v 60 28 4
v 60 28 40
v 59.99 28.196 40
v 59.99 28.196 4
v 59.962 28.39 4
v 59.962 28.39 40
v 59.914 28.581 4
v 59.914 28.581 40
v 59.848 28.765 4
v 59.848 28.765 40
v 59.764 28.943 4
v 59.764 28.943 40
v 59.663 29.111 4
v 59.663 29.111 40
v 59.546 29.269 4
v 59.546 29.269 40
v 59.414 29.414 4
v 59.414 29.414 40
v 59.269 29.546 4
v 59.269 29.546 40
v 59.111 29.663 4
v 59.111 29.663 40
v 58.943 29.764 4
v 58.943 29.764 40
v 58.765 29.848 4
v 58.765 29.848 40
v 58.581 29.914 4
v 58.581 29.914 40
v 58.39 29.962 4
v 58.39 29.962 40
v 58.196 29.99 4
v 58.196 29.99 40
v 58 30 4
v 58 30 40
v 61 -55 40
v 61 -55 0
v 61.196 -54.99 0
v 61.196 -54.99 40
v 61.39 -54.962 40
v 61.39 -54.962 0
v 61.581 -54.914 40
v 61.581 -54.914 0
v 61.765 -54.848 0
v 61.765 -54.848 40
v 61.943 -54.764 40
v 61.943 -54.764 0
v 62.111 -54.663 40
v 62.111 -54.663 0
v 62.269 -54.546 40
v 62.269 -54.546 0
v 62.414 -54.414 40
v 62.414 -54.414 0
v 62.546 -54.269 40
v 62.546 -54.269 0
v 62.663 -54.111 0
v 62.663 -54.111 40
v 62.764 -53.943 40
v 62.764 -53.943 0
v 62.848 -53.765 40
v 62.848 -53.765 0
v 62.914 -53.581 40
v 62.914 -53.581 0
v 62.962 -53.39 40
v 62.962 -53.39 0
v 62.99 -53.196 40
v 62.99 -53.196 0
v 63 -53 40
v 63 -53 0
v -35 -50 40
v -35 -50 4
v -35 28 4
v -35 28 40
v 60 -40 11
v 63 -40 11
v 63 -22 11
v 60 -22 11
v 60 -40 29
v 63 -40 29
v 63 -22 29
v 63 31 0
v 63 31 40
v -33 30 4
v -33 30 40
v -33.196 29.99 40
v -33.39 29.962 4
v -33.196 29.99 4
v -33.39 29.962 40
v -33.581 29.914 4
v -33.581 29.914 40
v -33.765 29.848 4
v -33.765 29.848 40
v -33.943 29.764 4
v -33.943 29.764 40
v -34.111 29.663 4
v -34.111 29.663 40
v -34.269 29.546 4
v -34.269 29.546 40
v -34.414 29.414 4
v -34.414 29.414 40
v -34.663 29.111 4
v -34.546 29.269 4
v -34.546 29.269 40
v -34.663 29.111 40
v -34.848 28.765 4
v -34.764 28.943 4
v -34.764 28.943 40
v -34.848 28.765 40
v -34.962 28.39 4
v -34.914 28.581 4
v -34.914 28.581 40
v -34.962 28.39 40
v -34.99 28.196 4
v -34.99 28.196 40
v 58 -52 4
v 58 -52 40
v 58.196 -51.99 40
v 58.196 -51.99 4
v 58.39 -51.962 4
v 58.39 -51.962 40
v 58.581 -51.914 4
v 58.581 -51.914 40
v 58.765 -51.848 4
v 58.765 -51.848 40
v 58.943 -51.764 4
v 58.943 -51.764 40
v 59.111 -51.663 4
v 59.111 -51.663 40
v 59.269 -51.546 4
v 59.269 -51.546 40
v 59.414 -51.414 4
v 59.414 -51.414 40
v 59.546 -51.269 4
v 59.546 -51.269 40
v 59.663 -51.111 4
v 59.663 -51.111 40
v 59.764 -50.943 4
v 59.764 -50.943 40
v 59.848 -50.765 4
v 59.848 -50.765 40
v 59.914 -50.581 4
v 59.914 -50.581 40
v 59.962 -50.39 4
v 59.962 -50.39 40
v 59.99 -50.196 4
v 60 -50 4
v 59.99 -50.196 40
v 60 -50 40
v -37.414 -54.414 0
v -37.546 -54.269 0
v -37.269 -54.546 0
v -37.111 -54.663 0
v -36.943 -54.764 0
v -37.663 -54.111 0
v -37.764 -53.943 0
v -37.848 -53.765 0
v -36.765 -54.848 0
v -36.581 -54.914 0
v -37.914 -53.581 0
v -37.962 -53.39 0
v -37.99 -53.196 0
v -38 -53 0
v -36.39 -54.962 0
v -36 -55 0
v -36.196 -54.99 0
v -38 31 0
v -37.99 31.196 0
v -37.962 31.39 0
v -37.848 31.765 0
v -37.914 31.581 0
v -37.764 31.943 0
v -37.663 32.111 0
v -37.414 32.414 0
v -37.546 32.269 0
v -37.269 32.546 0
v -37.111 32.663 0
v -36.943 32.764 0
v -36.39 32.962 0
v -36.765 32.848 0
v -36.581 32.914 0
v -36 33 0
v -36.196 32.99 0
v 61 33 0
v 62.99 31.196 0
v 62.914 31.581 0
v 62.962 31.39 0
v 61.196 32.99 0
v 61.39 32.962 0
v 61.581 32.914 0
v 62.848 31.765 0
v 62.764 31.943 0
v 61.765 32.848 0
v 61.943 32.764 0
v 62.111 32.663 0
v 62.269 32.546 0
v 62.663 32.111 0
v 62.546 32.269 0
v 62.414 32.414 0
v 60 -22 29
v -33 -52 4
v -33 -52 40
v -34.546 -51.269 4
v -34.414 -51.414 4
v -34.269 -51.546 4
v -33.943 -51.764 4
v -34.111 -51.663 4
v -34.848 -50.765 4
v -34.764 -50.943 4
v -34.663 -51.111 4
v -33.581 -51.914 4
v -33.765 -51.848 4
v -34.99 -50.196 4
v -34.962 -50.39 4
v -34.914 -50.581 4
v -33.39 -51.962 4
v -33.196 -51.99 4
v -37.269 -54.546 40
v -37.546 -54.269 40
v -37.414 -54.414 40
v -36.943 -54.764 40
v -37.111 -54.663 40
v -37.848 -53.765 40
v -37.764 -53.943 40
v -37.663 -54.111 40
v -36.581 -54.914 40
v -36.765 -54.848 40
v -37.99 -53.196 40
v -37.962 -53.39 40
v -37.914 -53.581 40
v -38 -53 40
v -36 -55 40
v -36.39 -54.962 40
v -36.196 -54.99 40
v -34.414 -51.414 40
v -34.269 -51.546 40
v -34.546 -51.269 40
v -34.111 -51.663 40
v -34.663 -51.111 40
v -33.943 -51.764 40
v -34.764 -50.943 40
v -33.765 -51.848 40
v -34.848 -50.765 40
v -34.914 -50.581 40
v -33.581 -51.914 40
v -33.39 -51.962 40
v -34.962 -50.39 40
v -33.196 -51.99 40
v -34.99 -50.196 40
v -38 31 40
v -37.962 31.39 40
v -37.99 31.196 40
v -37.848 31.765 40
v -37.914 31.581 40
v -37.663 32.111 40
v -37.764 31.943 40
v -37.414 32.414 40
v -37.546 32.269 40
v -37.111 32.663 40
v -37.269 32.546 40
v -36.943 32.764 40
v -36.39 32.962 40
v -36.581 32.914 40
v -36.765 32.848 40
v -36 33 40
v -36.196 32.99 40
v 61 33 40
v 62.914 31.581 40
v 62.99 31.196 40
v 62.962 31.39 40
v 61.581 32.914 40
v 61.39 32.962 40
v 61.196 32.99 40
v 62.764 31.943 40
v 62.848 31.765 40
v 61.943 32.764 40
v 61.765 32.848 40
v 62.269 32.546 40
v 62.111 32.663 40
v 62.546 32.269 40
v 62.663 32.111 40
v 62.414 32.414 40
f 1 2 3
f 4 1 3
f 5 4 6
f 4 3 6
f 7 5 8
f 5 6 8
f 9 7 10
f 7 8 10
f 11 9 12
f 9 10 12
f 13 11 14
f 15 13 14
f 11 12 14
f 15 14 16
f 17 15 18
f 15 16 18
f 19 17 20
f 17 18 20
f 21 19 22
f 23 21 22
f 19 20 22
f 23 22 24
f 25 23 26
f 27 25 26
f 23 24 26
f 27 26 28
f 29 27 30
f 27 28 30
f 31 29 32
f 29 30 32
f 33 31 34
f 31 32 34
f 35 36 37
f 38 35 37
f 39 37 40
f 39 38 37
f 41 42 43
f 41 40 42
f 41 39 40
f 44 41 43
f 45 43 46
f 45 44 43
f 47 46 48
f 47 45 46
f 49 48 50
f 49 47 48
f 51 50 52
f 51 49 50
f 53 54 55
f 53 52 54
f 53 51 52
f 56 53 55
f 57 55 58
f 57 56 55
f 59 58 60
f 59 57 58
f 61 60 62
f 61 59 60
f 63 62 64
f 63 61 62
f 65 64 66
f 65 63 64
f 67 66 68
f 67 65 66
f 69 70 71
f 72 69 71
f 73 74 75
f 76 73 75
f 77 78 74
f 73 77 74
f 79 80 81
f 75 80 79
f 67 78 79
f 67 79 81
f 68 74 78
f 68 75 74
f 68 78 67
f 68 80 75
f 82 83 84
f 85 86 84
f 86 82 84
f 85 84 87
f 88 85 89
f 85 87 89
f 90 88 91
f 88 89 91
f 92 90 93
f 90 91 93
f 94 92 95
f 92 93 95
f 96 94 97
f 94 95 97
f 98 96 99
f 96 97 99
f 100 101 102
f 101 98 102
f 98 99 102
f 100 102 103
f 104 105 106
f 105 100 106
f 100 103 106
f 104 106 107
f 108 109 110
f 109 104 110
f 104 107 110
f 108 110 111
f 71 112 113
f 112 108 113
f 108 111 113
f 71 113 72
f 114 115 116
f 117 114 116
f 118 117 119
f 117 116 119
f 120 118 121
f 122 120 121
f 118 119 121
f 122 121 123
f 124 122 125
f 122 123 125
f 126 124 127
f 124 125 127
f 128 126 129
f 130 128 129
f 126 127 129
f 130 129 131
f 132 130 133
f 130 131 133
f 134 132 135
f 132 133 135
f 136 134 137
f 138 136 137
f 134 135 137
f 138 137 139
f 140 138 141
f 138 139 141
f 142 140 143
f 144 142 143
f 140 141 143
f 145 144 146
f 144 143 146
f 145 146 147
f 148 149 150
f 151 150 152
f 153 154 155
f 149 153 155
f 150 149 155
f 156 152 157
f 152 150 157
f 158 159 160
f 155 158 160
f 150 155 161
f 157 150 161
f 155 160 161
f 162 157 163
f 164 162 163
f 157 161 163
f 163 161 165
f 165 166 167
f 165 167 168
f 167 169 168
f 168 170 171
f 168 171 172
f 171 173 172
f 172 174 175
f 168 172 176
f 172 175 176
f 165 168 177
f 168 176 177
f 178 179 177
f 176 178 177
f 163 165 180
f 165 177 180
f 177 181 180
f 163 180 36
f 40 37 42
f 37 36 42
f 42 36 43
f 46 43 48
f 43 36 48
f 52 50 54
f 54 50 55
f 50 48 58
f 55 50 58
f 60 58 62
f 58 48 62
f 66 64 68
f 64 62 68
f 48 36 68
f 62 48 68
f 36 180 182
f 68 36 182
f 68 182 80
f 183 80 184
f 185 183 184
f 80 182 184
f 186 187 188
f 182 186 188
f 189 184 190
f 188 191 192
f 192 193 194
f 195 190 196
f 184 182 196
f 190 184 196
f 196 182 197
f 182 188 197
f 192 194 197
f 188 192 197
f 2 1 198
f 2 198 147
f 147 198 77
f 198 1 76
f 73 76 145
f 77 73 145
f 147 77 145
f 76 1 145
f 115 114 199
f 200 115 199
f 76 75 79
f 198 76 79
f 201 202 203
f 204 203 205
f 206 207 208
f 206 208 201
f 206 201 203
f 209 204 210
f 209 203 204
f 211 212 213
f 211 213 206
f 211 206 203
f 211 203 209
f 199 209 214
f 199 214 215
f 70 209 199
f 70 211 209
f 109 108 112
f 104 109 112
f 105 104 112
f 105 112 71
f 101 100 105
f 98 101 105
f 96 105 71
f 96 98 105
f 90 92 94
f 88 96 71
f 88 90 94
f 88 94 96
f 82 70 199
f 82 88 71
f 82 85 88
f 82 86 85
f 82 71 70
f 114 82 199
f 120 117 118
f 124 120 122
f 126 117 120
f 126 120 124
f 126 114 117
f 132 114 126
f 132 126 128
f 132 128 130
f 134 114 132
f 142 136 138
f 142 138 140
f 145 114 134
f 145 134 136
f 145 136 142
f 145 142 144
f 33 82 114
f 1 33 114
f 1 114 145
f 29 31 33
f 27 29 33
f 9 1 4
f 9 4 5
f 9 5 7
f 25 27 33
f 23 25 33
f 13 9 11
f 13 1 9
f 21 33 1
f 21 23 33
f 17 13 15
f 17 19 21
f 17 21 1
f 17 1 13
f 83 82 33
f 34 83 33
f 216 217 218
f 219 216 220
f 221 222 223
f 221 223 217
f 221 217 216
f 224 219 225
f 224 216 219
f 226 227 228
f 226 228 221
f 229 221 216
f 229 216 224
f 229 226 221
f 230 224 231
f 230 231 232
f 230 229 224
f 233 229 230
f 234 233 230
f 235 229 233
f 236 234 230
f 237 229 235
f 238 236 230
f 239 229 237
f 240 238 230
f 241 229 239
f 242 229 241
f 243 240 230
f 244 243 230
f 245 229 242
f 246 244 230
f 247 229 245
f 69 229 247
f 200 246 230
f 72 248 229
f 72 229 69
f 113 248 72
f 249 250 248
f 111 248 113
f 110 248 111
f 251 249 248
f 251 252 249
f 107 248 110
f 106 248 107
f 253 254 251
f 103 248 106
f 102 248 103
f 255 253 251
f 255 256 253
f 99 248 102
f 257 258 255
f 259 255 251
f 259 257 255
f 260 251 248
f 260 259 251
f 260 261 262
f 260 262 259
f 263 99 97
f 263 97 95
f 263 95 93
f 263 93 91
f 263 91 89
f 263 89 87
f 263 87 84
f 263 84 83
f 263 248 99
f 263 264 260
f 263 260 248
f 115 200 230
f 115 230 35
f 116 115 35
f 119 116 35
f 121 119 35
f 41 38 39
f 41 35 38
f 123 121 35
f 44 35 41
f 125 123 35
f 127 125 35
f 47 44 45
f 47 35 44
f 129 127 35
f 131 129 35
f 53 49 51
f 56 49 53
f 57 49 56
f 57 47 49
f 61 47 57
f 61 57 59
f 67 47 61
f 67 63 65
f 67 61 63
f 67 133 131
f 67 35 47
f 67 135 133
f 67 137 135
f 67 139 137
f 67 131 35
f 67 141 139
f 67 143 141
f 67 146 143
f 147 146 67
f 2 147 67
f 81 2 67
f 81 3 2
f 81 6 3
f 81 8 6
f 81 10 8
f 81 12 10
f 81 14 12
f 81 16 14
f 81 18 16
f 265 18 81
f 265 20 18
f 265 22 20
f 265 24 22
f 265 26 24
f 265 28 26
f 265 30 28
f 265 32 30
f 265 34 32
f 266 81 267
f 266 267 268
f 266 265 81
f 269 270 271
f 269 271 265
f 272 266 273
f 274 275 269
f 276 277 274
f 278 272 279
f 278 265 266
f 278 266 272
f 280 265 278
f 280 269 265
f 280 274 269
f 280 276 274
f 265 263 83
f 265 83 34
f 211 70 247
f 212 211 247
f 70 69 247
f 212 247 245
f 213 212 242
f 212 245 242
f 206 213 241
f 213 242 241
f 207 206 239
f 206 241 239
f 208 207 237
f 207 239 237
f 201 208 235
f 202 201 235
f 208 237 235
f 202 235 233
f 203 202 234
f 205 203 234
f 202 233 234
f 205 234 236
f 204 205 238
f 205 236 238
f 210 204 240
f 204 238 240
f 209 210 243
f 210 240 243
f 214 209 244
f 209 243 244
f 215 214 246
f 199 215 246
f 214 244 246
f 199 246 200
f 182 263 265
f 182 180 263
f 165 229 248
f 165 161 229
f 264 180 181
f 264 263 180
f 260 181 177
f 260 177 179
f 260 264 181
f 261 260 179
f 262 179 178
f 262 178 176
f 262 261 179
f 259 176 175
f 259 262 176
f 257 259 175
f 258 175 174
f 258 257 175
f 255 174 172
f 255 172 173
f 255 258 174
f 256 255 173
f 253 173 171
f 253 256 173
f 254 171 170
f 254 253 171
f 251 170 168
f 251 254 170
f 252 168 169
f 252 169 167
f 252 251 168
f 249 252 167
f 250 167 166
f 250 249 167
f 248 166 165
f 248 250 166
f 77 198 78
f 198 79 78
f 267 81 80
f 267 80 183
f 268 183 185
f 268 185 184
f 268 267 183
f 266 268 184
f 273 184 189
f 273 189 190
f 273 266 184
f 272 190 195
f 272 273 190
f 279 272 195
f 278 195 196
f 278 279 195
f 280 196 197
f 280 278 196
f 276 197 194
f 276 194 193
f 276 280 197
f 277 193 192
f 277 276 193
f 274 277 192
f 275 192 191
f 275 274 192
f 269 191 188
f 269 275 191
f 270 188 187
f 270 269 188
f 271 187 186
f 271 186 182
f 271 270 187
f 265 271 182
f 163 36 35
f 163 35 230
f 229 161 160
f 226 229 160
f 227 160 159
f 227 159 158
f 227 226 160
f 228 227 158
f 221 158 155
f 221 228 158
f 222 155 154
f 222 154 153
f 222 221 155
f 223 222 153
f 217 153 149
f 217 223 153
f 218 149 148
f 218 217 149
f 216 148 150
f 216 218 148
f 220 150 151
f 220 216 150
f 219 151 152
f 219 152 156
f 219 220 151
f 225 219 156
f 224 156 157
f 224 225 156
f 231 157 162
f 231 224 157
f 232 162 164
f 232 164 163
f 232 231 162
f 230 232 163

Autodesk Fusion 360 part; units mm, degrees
sketch "Sketch1" plane through (0, 0, 0) normal (0, 0, 1) x (1, 0, 0)
  line L0 (-35, 30) -> (60, 30)
  line L1 (60, 30) -> (60, -52)
  line L2 (60, -52) -> (-35, -52)
  line L3 (-35, -52) -> (-35, 30)
  line L4 (-38, 33) -> (63, 33)
  line L5 (63, 33) -> (63, -55)
  line L6 (63, -55) -> (-38, -55)
  line L7 (-38, -55) -> (-38, 33)
  dimension "d1" = 82
  dimension "d2" = 95
  dimension "d3" = 3
  dimension "d4" = 3
  dimension "d5" = 3
  dimension "d6" = 3
extrude "Extrude1" add sketch "Sketch1" along normal blind 40
extrude "Extrude2" add sketch "Sketch1" along normal blind 4 contours L0 L1 L2 L3
sketch "Sketch2" plane through (63, 0, 0) normal (1, 0, 0) x (0, 1, 0)
  line L0 (-55, 0) -> (33, 0)
  line L1 (33, 0) -> (33, 40)
  line L2 (33, 40) -> (-55, 40)
  line L3 (-55, 40) -> (-55, 0)
  line L4 (-22, 29) -> (-40, 29)
  line L5 (-40, 29) -> (-40, 11)
  line L6 (-40, 11) -> (-22, 11)
  line L7 (-22, 11) -> (-22, 29)
  line L8 (-22, 29) -> (-40, 11) construction
  line L9 (-40, 29) -> (-22, 11) construction
  point P0 (-31, 20)
  dimension "d11" = 18
  dimension "d12" = 18
  dimension "d13" = 15
  dimension "d14" = 11
extrude "Extrude3" cut sketch "Sketch2" against normal blind 3 contours L4 L5 L6 L7
fillet "Fillet1" radius 2 1 edges at (63, -55, 20)
fillet "Fillet2" radius 2 1 edges at (63, 33, 20)
fillet "Fillet3" radius 2 1 edges at (-38, 33, 20)
fillet "Fillet4" radius 2 1 edges at (-38, -55, 20)
fillet "Fillet5" radius 2 1 edges at (-35, 30, 22)
fillet "Fillet6" radius 2 1 edges at (-35, -52, 22)
fillet "Fillet7" radius 2 1 edges at (60, -52, 22)
fillet "Fillet8" radius 2 1 edges at (60, 30, 22)
